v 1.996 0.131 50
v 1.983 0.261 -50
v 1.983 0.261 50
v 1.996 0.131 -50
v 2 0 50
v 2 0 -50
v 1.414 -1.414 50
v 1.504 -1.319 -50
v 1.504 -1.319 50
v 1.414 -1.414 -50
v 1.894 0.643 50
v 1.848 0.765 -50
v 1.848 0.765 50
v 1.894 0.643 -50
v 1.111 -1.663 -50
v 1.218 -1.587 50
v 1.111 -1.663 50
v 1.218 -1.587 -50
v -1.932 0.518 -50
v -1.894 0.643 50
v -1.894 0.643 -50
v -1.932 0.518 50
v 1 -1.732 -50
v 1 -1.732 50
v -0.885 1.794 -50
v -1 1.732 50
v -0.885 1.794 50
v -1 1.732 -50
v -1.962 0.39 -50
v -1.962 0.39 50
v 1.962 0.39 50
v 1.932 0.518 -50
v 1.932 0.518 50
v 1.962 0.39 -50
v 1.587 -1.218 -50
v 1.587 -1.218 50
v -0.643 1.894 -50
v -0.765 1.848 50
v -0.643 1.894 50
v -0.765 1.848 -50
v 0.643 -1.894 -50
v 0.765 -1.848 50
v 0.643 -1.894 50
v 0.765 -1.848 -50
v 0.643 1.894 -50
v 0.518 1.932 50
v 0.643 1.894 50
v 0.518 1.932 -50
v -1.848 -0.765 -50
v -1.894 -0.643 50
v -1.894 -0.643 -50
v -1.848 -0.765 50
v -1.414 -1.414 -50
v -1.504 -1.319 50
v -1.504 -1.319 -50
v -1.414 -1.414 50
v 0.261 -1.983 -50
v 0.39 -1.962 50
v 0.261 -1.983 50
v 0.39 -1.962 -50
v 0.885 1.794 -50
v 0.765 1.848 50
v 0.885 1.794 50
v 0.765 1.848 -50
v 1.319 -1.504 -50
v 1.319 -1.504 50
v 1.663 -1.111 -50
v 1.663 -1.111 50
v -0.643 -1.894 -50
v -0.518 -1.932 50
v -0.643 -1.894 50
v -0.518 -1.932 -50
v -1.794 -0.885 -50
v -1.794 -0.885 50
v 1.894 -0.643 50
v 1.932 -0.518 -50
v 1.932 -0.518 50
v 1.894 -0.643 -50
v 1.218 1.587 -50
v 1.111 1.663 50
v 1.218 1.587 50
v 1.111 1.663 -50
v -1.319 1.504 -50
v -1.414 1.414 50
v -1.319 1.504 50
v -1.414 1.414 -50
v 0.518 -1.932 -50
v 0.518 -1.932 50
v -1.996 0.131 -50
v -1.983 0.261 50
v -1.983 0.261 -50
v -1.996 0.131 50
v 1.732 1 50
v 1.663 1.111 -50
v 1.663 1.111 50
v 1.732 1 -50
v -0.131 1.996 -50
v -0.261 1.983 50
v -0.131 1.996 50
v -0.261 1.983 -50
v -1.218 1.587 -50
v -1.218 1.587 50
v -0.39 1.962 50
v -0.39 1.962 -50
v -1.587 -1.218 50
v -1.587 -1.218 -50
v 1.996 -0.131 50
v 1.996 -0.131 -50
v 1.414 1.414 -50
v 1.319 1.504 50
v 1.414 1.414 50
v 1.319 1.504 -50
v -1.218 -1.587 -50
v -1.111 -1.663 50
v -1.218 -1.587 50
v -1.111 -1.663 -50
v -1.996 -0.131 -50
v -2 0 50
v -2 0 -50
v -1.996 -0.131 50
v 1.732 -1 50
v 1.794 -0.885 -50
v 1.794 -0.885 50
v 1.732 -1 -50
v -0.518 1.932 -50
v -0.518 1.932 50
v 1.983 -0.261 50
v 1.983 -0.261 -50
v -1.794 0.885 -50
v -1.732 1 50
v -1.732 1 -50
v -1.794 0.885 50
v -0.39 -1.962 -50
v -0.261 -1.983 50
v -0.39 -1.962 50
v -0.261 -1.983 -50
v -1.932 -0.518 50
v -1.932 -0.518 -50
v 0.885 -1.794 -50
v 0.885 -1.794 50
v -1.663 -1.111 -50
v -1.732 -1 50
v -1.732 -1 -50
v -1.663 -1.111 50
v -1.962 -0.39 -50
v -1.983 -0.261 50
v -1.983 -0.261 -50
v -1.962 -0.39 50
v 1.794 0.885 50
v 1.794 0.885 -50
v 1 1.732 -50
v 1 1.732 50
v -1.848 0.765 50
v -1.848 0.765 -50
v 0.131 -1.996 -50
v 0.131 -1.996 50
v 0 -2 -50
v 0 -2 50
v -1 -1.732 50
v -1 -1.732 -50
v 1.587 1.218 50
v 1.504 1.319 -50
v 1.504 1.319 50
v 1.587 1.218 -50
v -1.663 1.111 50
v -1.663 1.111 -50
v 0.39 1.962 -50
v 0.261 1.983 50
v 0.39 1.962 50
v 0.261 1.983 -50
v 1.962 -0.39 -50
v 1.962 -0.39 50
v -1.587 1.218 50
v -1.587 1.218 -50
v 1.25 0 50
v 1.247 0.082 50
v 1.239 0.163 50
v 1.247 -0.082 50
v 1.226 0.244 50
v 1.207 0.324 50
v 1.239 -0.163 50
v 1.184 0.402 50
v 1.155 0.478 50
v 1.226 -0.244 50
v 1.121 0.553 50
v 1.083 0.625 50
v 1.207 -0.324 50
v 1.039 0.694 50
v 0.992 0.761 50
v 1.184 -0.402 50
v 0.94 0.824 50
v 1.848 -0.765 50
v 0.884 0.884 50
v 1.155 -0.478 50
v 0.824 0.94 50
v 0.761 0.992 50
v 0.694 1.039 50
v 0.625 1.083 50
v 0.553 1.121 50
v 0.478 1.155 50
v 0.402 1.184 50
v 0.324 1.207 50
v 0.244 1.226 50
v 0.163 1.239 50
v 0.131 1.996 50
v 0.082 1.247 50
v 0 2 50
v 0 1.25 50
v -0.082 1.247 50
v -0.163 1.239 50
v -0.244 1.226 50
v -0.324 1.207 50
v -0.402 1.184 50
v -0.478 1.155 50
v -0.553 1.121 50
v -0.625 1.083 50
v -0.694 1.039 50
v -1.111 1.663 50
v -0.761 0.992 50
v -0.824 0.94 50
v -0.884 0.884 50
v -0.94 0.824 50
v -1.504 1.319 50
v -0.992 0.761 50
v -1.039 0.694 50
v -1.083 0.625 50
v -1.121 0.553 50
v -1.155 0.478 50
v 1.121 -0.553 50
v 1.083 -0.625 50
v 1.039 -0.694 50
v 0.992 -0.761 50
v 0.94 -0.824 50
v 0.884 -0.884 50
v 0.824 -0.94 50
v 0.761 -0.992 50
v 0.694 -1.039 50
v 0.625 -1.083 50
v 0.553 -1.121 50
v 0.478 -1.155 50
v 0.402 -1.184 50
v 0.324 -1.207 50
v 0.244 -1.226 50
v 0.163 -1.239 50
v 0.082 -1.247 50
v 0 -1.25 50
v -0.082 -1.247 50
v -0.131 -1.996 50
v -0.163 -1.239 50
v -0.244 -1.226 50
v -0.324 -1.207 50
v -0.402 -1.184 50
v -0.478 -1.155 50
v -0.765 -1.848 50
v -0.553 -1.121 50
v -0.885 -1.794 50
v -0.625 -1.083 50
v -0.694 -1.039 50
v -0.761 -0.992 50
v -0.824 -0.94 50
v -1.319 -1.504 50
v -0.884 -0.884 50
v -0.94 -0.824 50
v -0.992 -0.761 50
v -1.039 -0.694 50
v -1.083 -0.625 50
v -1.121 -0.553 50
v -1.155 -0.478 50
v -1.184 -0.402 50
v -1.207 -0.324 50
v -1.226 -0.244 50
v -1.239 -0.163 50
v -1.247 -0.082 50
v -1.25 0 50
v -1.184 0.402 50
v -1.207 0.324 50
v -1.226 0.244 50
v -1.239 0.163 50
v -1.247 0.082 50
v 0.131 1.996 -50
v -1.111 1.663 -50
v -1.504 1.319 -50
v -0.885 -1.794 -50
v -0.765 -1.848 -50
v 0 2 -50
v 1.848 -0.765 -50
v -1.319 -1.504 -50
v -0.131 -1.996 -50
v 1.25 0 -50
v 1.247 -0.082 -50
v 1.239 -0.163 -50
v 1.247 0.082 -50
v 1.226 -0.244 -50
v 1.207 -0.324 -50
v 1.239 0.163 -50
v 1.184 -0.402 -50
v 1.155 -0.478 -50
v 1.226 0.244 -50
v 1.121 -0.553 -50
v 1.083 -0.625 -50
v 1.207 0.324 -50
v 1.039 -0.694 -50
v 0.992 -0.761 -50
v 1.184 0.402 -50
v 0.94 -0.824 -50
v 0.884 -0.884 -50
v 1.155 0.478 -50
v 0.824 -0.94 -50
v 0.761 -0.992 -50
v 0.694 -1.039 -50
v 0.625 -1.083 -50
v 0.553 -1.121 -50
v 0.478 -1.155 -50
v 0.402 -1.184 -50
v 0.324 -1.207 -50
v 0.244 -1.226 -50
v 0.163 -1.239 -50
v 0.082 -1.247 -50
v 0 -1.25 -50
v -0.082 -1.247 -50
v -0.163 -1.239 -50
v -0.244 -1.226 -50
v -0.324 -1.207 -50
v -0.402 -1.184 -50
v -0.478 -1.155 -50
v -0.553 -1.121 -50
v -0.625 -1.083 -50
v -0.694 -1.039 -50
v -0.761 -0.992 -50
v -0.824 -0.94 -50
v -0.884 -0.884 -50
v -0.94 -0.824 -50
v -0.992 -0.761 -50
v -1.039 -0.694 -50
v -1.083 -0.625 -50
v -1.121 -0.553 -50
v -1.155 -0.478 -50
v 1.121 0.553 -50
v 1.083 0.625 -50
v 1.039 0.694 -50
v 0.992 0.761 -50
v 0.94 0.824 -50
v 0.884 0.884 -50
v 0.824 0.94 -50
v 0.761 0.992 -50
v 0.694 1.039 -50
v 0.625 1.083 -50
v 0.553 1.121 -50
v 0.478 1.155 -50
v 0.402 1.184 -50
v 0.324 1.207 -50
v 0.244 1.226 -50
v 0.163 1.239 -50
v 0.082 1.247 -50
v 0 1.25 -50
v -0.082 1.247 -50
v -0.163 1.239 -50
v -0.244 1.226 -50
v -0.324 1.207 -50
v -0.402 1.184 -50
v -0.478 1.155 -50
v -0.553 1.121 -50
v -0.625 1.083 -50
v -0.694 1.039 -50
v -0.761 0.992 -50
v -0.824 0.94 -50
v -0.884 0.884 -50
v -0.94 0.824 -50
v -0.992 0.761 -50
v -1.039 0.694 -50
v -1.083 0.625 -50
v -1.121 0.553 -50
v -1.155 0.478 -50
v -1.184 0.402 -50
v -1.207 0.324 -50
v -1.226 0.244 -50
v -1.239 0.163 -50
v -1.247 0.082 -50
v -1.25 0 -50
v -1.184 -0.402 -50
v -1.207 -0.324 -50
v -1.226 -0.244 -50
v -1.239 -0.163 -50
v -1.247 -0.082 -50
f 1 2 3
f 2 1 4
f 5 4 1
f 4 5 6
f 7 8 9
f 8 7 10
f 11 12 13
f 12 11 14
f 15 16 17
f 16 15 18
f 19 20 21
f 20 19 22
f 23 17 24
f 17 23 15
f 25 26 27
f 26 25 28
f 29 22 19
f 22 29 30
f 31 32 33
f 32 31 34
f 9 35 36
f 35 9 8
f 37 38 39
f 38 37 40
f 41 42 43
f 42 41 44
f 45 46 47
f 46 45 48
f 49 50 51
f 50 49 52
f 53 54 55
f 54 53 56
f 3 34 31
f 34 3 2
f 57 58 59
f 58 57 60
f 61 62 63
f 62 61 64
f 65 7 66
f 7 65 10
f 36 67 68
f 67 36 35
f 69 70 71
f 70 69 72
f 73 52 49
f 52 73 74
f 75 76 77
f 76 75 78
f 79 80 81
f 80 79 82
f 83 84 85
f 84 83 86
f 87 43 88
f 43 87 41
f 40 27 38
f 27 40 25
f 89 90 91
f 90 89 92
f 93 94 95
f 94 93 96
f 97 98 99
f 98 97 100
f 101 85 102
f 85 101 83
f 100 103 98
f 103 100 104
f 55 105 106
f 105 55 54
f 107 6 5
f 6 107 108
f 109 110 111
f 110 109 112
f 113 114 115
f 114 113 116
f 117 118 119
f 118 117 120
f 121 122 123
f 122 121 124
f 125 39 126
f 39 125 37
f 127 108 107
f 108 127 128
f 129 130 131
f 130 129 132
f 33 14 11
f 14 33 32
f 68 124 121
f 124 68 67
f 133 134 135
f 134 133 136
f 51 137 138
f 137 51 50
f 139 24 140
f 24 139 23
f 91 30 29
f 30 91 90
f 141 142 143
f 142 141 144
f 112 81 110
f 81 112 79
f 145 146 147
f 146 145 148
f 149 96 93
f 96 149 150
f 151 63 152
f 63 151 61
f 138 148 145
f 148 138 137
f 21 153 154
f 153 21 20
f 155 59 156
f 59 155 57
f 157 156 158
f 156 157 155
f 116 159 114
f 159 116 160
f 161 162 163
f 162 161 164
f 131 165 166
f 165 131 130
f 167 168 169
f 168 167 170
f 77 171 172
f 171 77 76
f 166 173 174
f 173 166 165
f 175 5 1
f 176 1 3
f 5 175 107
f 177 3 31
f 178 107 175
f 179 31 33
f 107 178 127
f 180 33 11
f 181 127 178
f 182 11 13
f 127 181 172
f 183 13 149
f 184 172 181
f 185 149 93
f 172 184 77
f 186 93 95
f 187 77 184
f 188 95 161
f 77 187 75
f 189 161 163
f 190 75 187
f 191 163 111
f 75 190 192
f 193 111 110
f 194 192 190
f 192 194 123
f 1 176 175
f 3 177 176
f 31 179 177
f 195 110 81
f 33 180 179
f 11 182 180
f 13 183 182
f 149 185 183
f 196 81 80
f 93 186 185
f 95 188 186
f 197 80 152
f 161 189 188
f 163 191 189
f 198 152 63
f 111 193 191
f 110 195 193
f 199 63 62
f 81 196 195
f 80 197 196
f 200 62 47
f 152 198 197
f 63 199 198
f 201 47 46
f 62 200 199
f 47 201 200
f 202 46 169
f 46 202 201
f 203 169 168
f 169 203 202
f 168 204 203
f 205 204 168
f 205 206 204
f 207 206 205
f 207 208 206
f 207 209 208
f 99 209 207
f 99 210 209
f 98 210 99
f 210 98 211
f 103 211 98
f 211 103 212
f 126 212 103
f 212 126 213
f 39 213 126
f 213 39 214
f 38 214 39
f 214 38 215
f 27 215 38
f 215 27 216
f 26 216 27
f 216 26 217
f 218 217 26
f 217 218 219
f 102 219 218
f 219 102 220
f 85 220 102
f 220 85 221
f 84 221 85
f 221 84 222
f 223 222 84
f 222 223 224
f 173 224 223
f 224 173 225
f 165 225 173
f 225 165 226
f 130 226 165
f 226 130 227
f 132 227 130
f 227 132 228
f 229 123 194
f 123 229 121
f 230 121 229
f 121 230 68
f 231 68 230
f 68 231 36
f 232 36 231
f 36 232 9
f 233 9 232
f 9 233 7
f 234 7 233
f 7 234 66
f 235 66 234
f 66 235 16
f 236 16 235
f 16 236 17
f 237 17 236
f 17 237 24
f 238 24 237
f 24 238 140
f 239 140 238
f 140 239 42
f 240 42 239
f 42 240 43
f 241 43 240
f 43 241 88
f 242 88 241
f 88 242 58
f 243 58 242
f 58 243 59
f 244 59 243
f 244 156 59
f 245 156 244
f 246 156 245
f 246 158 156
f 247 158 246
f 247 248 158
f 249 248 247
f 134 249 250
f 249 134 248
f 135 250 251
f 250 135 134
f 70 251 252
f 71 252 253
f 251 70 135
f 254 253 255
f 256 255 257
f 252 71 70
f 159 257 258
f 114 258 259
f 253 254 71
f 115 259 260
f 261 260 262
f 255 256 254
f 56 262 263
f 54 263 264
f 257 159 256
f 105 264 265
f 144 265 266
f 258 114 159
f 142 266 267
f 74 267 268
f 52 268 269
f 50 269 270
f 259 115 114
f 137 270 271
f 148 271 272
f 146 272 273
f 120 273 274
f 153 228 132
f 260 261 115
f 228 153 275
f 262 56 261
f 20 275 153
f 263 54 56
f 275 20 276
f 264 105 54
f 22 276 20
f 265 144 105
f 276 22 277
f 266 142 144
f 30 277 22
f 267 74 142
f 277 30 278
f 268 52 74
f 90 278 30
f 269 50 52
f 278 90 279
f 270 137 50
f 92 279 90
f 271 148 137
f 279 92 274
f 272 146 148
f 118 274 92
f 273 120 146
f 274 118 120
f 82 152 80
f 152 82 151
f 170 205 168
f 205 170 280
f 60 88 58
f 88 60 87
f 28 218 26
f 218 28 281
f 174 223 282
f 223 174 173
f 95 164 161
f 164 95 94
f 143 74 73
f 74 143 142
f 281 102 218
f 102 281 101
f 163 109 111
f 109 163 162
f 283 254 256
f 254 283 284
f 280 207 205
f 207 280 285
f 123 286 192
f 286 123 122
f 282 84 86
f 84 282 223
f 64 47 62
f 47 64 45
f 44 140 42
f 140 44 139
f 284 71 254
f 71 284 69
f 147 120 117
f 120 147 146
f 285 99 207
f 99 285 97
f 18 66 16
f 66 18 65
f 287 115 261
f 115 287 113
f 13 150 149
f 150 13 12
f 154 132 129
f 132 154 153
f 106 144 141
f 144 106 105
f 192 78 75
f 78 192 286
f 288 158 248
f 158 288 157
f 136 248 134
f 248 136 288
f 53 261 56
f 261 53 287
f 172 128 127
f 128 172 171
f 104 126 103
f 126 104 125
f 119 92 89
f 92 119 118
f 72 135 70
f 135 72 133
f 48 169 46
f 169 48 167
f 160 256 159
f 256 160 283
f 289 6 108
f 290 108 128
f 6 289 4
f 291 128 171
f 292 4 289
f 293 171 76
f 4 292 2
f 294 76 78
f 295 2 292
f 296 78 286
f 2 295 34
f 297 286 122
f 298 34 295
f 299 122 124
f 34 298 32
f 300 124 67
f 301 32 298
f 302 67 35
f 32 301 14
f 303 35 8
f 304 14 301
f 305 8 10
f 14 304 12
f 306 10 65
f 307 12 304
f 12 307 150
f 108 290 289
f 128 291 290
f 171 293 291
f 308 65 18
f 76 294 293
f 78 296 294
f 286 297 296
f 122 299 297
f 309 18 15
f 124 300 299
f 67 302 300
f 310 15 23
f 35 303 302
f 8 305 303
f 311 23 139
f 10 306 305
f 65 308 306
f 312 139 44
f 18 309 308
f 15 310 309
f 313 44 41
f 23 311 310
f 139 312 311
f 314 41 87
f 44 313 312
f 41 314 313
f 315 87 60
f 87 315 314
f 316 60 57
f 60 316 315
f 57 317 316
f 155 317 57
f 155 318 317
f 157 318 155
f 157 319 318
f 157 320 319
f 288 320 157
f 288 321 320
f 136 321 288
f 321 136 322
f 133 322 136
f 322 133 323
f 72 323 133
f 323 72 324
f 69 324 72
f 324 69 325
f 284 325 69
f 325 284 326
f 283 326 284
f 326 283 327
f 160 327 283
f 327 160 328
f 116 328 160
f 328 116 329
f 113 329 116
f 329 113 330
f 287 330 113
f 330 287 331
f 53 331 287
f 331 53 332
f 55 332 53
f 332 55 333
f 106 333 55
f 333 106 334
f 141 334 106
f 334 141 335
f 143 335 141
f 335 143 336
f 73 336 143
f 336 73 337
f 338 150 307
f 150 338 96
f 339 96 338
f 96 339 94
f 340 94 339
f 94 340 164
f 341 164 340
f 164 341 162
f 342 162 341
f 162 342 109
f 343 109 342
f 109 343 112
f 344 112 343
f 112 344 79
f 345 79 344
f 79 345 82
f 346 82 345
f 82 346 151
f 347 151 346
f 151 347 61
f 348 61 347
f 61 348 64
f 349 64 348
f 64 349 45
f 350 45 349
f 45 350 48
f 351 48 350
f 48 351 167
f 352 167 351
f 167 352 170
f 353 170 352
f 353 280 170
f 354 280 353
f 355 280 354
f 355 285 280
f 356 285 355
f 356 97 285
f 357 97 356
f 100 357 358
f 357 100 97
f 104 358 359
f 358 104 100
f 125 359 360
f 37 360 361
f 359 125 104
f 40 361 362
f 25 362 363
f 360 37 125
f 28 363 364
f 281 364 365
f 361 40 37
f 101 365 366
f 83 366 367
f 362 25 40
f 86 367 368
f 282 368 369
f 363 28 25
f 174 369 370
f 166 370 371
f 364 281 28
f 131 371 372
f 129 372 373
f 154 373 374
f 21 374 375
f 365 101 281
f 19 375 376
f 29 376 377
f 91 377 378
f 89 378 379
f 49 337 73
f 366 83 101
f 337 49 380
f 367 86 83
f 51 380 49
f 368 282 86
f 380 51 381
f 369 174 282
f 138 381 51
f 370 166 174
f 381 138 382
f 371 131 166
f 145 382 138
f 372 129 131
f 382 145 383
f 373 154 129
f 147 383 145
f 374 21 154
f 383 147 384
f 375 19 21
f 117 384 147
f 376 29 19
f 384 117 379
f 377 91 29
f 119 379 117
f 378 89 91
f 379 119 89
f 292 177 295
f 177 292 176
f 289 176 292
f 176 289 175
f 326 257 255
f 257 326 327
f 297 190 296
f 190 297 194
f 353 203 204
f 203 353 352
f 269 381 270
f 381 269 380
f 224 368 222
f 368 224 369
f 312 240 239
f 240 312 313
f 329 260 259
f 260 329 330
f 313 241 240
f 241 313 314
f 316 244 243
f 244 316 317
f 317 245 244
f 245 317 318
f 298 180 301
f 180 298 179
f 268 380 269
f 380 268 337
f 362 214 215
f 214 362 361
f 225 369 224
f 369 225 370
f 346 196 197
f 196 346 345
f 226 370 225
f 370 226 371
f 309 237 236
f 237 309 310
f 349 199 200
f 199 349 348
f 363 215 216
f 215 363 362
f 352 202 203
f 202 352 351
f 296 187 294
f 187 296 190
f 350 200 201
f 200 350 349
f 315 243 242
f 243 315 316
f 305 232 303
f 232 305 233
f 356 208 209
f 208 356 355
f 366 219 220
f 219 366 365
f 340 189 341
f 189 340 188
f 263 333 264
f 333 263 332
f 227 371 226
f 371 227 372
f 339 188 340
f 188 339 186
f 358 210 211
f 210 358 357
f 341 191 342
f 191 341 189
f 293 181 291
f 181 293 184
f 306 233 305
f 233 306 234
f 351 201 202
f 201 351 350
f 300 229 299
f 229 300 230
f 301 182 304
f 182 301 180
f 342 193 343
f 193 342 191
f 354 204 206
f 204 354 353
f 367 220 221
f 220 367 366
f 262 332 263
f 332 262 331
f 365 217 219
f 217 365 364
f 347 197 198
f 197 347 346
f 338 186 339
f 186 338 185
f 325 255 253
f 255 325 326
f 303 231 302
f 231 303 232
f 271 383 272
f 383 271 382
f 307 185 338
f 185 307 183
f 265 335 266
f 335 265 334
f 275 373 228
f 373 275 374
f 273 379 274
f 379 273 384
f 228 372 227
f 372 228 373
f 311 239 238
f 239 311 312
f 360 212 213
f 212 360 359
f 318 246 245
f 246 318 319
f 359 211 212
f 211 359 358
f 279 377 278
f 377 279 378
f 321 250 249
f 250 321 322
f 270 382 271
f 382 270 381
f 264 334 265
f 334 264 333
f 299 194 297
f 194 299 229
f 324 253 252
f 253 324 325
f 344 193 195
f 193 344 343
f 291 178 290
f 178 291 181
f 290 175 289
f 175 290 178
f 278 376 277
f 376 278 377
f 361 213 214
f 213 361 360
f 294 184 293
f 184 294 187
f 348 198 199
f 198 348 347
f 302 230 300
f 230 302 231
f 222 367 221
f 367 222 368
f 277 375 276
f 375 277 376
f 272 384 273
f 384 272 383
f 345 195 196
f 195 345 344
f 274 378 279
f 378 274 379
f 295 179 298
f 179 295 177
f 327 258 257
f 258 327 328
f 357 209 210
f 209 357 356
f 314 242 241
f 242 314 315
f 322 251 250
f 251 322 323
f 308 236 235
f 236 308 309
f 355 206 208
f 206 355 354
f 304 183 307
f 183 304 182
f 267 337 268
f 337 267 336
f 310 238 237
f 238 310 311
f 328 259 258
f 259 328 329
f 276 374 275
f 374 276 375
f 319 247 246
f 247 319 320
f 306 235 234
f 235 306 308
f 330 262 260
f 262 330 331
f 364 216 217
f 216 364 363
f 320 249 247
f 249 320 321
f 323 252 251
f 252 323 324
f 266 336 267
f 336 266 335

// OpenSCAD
$fn=96;

module ptfe_tube(length=100, od=4, id=2.5) {
    difference() {
        cylinder(h=length, d=od, center=true);
        cylinder(h=length+0.2, d=id, center=true);
    }
}

ptfe_tube(length=100, od=4, id=2.5);
